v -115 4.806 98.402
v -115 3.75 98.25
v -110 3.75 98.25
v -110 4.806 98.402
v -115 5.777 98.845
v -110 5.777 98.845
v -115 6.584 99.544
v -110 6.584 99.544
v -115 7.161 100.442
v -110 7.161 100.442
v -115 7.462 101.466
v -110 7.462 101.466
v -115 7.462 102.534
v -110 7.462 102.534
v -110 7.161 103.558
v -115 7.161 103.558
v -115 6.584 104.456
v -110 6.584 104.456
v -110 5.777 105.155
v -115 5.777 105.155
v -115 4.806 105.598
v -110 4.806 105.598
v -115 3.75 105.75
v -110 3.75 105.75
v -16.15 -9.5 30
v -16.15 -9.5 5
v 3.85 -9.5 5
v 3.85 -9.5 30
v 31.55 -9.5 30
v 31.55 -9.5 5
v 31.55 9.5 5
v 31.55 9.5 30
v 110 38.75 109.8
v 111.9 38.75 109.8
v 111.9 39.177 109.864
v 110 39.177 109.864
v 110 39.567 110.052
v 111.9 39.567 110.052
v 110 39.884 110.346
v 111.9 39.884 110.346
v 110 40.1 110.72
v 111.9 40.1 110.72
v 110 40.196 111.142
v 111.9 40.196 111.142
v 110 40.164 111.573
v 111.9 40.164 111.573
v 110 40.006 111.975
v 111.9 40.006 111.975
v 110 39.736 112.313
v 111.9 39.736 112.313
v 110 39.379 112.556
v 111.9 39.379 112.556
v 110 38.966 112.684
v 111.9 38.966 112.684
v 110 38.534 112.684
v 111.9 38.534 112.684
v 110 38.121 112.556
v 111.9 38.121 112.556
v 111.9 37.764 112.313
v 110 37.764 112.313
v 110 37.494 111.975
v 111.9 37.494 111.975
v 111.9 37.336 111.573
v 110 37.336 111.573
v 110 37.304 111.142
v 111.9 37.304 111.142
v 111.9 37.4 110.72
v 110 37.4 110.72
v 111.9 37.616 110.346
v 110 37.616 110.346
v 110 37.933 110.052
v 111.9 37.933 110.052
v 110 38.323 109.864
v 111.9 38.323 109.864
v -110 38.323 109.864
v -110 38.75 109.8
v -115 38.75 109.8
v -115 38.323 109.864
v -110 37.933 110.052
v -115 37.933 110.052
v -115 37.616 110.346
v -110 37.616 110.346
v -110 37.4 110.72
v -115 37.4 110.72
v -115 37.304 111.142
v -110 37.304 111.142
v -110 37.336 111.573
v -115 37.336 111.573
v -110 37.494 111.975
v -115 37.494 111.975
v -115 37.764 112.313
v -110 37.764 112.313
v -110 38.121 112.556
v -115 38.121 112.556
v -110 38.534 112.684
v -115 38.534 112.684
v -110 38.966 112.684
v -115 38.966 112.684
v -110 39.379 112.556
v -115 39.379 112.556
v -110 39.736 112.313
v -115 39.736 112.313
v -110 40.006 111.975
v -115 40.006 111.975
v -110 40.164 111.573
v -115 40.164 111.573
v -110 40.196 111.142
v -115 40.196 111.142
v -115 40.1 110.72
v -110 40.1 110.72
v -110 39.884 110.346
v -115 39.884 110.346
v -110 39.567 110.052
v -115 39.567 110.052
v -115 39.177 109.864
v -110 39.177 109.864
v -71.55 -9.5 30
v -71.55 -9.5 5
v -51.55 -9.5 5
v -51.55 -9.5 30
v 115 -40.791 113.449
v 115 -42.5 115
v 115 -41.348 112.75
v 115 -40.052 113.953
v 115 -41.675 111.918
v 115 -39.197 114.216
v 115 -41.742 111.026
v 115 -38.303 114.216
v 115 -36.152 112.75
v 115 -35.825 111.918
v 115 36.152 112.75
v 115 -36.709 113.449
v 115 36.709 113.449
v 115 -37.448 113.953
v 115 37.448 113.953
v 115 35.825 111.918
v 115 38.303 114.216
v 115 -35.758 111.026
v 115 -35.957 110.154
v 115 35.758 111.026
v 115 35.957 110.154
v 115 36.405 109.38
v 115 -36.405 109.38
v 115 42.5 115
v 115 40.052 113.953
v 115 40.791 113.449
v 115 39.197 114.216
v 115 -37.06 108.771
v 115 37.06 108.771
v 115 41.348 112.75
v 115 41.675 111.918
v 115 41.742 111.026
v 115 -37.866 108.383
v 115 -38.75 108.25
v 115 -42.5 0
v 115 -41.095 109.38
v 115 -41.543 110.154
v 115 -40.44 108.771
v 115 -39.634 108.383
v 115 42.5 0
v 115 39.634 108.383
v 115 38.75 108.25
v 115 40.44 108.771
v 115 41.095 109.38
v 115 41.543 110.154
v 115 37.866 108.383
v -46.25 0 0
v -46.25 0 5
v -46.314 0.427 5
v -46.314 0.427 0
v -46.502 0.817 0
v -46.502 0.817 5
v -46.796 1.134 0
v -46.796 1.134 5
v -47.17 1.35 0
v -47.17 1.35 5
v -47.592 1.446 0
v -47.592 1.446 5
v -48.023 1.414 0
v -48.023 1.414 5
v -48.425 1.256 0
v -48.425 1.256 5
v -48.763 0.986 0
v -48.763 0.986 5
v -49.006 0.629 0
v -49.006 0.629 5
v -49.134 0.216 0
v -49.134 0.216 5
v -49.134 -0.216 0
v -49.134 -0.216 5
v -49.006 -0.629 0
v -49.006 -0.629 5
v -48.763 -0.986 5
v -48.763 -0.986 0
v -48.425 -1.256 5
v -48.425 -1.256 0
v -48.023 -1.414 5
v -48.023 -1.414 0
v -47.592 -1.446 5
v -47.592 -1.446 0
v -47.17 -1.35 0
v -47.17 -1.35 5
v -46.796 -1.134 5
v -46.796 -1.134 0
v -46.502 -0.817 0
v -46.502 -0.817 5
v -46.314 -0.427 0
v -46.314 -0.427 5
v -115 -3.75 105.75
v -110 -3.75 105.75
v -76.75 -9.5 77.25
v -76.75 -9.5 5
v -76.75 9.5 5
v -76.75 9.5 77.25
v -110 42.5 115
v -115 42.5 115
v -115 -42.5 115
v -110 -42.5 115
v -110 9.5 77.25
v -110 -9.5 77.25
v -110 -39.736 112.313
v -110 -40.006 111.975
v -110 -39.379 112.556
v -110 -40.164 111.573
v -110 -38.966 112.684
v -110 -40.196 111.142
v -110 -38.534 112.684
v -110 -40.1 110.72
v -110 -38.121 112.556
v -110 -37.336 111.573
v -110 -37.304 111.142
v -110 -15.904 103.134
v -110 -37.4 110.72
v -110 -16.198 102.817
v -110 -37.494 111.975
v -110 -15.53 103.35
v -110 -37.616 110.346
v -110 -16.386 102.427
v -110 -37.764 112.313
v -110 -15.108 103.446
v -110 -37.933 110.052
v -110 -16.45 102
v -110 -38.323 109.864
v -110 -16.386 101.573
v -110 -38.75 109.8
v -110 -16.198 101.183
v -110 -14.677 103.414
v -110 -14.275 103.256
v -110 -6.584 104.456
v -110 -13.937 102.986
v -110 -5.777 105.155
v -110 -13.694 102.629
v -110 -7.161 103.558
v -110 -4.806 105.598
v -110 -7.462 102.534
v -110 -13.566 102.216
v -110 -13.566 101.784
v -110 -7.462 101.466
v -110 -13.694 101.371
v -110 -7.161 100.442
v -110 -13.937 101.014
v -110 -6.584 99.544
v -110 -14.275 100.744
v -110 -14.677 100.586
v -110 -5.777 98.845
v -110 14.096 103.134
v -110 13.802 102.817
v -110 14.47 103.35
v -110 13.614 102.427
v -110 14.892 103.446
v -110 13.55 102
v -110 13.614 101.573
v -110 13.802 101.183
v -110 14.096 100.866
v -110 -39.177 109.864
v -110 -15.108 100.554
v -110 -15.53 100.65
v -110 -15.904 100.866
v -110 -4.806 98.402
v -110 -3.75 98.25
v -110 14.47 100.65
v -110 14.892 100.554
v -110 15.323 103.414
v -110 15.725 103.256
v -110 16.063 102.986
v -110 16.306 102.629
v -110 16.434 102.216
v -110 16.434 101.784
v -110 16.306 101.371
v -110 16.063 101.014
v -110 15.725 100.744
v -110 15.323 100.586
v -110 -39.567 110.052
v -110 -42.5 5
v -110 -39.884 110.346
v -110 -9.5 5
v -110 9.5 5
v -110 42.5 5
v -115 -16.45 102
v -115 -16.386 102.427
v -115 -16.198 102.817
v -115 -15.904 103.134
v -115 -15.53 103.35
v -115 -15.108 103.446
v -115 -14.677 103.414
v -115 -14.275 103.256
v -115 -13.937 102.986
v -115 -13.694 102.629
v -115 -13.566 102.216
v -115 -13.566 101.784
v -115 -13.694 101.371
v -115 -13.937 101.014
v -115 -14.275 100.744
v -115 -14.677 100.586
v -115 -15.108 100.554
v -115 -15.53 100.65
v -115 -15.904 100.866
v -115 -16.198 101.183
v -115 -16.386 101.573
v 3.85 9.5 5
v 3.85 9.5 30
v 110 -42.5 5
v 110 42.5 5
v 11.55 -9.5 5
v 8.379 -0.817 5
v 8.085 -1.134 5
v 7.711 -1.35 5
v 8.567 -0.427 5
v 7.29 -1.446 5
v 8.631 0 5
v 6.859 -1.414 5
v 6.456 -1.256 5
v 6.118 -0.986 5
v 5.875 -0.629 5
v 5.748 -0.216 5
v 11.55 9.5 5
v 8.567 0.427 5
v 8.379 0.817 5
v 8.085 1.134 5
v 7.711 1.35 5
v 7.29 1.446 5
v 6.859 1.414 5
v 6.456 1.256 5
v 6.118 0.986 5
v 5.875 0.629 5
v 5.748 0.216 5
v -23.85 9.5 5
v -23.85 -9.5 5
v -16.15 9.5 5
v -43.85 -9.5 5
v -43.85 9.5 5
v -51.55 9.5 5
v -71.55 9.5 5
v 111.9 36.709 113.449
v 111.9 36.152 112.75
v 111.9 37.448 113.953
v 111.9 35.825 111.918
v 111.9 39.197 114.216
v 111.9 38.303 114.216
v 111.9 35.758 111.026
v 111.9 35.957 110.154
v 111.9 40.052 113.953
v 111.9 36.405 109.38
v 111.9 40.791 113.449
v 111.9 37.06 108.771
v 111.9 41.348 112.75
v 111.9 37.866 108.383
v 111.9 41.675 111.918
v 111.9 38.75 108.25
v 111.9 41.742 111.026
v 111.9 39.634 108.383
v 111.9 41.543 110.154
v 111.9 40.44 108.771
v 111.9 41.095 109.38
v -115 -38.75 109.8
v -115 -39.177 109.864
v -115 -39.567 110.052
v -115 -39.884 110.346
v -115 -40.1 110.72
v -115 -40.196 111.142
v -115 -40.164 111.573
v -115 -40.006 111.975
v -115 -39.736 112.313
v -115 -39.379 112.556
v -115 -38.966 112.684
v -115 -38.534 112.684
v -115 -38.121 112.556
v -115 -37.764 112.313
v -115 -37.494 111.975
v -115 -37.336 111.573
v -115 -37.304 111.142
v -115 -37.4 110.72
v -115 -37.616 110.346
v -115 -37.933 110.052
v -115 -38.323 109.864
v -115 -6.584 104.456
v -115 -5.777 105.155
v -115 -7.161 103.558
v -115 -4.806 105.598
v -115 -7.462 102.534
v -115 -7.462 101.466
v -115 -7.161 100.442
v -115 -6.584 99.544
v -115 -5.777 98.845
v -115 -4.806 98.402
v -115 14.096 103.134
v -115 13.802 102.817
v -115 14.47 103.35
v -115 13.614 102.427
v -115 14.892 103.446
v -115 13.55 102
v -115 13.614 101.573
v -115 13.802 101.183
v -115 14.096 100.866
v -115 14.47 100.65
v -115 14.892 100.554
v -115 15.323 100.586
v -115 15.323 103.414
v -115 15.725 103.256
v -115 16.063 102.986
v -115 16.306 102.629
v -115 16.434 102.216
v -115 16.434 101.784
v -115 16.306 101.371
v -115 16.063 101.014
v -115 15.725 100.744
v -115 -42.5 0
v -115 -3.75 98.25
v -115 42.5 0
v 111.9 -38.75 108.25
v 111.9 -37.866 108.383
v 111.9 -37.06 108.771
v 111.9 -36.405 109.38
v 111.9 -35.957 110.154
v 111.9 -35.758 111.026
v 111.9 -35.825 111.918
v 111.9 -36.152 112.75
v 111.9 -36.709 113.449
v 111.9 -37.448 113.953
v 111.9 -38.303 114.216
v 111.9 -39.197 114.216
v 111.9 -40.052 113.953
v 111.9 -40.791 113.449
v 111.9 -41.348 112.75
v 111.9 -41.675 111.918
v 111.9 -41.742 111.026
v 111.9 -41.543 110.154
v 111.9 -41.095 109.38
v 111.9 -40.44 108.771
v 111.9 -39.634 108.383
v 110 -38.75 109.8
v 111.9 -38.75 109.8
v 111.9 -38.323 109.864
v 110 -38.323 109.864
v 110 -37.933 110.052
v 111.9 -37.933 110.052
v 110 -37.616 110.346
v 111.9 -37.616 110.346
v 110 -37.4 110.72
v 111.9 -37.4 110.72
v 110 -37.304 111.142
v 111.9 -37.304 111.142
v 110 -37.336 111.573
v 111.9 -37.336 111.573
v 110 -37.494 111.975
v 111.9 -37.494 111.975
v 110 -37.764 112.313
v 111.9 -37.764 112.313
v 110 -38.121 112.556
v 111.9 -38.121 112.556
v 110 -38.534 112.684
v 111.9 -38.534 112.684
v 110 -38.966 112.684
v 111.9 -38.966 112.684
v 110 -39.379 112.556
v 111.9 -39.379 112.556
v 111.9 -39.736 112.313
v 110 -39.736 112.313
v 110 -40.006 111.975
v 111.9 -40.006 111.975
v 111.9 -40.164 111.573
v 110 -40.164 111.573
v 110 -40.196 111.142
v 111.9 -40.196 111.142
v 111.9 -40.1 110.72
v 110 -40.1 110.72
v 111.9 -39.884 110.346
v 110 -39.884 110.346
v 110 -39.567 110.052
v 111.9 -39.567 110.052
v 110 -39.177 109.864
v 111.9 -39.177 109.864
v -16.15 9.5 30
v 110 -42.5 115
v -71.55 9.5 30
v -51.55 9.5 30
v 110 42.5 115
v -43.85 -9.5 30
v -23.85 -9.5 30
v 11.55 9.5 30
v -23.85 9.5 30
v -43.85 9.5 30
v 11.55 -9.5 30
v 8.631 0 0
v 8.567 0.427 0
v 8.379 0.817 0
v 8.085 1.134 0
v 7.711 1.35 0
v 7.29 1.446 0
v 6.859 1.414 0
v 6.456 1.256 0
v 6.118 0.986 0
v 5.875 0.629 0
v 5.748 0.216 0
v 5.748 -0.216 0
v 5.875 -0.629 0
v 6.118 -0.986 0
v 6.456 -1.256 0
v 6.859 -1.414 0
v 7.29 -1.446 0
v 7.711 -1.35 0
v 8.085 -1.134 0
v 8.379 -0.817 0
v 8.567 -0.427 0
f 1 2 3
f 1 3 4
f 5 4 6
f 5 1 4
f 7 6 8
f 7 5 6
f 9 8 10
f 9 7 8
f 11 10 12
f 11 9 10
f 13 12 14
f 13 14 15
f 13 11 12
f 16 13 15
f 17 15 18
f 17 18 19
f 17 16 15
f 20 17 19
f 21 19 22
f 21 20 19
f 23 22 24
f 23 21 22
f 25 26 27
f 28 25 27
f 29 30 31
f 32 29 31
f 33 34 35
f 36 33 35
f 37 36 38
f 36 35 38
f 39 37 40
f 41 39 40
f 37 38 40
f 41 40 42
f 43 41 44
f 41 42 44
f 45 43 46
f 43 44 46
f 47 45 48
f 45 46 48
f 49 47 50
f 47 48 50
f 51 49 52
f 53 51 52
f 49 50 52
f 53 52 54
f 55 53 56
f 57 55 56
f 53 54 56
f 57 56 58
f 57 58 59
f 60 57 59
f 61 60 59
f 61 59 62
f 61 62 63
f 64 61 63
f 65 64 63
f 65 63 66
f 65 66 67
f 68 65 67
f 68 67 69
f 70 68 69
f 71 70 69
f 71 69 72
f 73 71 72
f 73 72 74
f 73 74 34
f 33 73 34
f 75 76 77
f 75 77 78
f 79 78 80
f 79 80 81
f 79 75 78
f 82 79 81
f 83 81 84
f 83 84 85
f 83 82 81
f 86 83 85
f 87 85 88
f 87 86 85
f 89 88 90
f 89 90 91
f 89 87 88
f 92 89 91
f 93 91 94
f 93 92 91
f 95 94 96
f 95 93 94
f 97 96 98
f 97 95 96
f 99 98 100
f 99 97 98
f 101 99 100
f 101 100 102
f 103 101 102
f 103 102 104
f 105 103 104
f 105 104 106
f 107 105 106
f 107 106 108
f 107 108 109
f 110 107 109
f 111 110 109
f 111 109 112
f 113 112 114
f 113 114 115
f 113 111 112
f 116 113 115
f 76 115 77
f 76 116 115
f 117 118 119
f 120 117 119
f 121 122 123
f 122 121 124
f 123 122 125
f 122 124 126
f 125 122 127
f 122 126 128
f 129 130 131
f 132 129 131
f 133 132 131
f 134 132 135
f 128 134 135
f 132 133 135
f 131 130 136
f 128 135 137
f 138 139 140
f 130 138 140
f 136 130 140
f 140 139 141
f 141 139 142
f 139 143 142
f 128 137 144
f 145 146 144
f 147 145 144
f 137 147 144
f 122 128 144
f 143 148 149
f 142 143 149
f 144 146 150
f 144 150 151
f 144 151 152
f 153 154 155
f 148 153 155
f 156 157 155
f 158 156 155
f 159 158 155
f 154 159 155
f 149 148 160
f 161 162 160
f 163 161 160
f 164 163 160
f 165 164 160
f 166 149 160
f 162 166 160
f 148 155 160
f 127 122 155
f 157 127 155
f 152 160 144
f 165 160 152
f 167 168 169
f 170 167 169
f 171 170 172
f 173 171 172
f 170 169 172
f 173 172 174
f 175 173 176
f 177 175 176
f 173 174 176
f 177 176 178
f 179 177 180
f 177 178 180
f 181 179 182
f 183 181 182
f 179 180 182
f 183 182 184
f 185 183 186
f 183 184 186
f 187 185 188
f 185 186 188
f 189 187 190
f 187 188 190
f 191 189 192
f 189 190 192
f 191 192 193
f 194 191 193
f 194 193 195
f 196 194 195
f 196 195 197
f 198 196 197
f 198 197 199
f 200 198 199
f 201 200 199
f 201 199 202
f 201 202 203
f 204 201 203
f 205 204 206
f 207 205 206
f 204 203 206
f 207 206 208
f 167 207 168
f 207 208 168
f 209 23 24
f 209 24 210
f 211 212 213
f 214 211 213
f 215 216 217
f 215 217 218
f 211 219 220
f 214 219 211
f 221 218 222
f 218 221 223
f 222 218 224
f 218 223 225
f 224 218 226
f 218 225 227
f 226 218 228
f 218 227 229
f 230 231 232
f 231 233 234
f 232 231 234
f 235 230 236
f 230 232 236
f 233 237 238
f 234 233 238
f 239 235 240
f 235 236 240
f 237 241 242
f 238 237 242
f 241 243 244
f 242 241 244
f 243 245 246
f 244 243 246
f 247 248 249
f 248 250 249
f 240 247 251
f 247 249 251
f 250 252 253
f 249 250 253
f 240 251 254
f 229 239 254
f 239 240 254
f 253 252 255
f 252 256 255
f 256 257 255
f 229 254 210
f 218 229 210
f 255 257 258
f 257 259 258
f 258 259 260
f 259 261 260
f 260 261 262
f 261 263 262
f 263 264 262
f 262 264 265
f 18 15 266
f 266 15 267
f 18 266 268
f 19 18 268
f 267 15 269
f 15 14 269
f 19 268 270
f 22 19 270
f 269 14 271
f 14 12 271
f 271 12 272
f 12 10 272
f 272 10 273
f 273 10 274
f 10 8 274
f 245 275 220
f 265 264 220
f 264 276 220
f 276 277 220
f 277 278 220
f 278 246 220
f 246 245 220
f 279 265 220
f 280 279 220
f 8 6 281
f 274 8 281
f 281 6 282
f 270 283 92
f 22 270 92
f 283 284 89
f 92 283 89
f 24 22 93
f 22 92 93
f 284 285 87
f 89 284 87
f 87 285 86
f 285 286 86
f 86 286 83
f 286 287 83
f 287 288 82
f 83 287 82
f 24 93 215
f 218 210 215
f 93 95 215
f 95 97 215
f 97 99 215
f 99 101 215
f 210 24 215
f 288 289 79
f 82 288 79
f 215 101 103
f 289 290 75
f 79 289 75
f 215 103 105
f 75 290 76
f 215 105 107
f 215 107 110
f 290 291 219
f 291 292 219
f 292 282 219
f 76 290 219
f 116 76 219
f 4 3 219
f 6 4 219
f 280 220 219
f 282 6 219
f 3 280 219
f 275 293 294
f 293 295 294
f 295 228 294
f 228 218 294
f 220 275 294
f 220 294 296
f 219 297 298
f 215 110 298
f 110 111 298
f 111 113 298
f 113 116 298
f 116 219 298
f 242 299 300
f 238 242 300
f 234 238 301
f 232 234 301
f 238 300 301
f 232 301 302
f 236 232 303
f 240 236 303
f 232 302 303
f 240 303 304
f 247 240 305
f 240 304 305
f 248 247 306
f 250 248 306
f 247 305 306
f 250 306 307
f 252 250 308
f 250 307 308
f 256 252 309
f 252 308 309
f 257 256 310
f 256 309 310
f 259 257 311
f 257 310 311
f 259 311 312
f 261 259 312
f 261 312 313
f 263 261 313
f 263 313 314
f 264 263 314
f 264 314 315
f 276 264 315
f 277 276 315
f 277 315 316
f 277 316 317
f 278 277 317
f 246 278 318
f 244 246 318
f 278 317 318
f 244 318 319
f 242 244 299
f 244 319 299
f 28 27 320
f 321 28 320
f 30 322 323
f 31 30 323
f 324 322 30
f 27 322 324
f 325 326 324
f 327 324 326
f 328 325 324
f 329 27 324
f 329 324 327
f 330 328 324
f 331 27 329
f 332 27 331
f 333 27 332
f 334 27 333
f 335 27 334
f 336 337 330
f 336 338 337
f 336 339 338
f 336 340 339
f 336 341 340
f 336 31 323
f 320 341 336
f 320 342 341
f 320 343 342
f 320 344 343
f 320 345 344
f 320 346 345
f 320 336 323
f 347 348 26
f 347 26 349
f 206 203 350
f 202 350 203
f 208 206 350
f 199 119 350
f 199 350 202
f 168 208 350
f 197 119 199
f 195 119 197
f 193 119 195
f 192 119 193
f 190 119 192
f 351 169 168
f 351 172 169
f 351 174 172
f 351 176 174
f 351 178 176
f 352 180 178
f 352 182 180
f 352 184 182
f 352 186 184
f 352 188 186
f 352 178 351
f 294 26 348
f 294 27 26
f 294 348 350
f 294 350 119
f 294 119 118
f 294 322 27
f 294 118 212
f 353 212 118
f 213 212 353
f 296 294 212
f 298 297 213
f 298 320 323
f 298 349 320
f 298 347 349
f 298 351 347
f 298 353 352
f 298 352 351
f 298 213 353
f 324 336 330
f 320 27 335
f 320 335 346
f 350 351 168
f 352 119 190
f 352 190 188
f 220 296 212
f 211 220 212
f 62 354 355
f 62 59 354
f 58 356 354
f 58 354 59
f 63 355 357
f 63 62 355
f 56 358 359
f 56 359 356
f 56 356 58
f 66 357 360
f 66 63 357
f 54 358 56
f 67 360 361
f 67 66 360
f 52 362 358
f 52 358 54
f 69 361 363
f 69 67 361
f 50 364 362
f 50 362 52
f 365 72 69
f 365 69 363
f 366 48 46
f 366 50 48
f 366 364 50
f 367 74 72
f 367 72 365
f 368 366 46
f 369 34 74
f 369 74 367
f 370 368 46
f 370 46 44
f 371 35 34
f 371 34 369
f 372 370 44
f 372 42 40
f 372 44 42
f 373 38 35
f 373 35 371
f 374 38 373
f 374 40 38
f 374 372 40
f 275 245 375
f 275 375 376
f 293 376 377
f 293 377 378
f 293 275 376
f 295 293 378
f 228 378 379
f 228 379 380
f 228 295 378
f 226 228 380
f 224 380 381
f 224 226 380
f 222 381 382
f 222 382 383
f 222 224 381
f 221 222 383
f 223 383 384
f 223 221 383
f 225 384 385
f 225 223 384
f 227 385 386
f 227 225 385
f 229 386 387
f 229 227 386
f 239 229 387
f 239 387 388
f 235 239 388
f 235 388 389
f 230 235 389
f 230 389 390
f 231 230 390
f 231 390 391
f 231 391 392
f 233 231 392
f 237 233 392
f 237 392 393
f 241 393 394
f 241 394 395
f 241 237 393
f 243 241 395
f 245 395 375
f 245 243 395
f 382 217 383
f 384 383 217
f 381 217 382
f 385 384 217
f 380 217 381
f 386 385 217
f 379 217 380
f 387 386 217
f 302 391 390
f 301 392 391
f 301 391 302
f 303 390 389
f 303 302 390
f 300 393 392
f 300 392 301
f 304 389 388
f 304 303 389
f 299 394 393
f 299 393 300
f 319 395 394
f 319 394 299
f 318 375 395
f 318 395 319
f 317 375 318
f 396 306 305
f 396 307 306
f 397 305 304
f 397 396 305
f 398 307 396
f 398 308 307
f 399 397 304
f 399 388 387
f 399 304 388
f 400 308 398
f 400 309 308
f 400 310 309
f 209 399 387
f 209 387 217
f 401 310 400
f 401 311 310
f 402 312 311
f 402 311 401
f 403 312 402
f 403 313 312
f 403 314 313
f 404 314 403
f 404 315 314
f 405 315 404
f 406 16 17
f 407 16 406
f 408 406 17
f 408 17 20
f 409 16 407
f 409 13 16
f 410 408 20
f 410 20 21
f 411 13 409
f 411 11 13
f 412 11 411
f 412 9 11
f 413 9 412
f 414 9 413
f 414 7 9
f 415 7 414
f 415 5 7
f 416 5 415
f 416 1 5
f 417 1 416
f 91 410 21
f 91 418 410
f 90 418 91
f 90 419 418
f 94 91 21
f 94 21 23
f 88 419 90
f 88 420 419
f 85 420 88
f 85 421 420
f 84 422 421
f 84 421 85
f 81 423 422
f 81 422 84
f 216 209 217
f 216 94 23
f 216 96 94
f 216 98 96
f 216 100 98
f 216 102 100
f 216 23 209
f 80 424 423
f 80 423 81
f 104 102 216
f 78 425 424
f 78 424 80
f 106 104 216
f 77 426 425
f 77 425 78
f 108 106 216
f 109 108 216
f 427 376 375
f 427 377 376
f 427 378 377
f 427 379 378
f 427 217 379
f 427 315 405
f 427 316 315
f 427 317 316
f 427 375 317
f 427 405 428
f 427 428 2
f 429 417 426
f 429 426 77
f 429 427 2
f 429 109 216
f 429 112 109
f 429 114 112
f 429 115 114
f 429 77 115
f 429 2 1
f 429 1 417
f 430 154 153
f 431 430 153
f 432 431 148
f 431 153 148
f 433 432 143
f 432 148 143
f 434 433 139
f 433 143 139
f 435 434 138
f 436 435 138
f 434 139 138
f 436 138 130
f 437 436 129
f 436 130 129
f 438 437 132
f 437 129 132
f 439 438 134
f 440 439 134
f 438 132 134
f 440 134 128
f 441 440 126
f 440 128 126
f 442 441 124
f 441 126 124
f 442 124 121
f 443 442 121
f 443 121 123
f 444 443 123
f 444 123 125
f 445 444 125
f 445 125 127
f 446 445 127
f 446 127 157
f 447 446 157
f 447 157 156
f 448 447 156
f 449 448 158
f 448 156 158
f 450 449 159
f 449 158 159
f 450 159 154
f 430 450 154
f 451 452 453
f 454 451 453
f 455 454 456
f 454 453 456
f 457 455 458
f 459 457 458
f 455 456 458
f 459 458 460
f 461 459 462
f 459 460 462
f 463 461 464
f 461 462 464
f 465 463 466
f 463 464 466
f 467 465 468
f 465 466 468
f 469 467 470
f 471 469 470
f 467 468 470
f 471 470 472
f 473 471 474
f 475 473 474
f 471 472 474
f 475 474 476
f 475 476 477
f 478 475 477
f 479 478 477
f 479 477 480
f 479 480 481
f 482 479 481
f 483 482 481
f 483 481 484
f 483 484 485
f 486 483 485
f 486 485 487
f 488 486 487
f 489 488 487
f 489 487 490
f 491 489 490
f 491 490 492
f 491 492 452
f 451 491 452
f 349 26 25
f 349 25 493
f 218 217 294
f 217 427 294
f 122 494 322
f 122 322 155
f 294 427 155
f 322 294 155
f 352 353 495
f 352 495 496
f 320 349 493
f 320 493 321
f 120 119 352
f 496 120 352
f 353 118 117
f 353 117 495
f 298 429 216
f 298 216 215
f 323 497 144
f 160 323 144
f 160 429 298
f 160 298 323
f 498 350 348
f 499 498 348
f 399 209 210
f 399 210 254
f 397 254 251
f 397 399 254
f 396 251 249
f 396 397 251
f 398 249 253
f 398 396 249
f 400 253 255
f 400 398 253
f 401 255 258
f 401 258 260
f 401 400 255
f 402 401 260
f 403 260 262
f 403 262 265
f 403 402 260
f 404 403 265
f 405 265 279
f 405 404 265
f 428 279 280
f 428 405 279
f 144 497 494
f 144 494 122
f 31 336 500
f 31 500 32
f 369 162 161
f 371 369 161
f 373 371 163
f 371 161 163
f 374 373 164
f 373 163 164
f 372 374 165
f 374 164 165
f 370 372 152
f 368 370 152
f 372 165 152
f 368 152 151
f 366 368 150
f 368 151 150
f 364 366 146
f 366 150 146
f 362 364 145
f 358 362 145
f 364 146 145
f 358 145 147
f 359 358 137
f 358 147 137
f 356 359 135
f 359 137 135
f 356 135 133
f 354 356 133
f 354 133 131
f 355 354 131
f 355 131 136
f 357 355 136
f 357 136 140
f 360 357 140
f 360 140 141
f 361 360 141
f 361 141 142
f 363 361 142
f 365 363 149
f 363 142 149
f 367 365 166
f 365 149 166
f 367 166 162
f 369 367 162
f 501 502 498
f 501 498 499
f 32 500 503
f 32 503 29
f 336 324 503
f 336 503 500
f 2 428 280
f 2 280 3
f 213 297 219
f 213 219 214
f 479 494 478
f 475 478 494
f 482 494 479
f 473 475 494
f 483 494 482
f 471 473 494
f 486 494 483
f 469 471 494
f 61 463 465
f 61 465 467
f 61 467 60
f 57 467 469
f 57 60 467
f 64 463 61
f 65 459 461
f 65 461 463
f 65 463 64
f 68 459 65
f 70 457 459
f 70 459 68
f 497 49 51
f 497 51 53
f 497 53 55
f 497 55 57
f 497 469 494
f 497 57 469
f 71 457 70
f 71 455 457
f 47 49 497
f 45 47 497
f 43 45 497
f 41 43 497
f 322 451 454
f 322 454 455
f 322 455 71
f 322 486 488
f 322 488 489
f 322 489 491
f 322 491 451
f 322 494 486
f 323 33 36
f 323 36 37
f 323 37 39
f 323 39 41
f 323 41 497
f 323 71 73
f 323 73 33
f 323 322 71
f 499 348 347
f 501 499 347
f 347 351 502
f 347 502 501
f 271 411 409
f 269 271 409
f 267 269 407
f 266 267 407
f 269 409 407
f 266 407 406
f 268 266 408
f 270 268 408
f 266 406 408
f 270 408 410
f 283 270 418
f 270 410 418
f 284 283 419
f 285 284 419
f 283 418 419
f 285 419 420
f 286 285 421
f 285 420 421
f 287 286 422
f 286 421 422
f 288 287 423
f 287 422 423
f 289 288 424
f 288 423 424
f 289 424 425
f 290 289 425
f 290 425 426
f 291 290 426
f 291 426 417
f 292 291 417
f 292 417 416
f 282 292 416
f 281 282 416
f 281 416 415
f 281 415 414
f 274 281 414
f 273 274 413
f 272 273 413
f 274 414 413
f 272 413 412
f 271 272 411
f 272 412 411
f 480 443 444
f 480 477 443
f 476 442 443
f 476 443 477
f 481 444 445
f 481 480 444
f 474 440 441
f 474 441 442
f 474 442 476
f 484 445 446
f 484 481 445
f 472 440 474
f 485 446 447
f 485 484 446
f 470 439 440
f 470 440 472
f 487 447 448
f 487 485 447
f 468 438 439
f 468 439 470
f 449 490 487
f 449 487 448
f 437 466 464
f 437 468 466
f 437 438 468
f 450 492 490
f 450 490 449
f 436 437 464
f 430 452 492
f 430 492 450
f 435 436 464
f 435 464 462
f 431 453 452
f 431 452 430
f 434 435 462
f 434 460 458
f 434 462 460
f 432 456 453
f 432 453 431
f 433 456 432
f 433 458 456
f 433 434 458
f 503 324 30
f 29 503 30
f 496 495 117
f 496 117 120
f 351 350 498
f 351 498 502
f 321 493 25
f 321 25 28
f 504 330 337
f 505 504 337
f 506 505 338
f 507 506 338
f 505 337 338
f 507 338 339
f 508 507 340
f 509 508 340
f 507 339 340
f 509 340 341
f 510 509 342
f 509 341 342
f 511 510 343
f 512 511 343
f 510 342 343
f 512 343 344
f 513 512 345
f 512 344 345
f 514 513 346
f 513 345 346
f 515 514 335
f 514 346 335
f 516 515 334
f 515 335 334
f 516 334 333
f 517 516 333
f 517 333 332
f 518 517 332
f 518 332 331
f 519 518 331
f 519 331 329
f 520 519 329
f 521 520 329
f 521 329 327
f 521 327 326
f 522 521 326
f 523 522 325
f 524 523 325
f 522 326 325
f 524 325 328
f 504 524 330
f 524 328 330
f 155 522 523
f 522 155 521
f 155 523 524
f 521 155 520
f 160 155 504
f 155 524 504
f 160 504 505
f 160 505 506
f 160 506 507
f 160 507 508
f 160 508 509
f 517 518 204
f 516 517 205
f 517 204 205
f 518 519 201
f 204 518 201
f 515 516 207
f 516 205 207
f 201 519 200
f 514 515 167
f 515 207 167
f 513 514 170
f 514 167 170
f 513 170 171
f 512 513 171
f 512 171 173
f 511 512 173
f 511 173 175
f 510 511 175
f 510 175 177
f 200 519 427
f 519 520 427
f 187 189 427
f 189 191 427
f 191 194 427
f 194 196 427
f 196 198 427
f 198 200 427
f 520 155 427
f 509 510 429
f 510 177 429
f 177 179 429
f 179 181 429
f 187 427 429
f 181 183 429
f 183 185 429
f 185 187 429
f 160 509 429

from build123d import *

# Parameters (mm, degrees)
BOSS_EXTRUDE1_DEPTH = 5
SKETCH2_W           = 5
SKETCH2_H           = 85
BOSS_EXTRUDE3_DEPTH = 110
SKETCH2_3_W         = 20
SKETCH2_3_H         = 19
BOSS_EXTRUDE4_DEPTH = 25
SKETCH3_R           = 1.45
CUT_EXTRUDE1_DEPTH  = 5
SKETCH4_R           = 1.45
CUT_EXTRUDE2_DEPTH  = 5
SKETCH5_R           = 3
SKETCH5_R_2         = 1.45
CUT_EXTRUDE3_DEPTH  = 3.1
SKETCH5_2_R         = 1.45
CUT_EXTRUDE4_DEPTH  = 5
CUT_EXTRUDE5_START  = -5
SKETCH6_R           = 1.45
CUT_EXTRUDE5_DEPTH  = 5
SKETCH2_7_W         = 33.25
SKETCH2_7_H         = 19
BOSS_EXTRUDE6_DEPTH = 72.25


with BuildPart() as part:
    # Sketch1 → Boss-Extrude1 (new body)
    with BuildSketch(Plane(origin=(0, 0, 0), x_dir=(0, 1, 0), z_dir=(0, 0, 1))):
        Polygon((-42.5, 94.306537639), (-42.5, -115), (42.5, -115), (42.5, 94.306537639), (42.5, 115), (-42.5, 115), align=None)
    extrude(amount=BOSS_EXTRUDE1_DEPTH)

    # Sketch2 → Boss-Extrude3 (add)
    with BuildSketch(Plane.XY.offset(5)):
        with Locations((-112.5, 0)):
            Rectangle(SKETCH2_W, SKETCH2_H)
        with Locations((112.5, 0)):
            Rectangle(SKETCH2_W, SKETCH2_H)
    extrude(amount=BOSS_EXTRUDE3_DEPTH)

    # Sketch2<3> → Boss-Extrude4 (add)
    with BuildSketch(Plane.XY.offset(5)):
        with Locations((-61.55, 0)):
            Rectangle(SKETCH2_3_W, SKETCH2_3_H)
        with Locations((-33.85, 0)):
            Rectangle(SKETCH2_3_W, SKETCH2_3_H)
        with Locations((-6.15, 0)):
            Rectangle(SKETCH2_3_W, SKETCH2_3_H)
        with Locations((21.55, 0)):
            Rectangle(SKETCH2_3_W, SKETCH2_3_H)
    extrude(amount=BOSS_EXTRUDE4_DEPTH)

    # Sketch3 → Cut-Extrude1 (cut)
    with BuildSketch(Plane(origin=(-115, 0, 0), x_dir=(0, -1, 0), z_dir=(-1, 0, 0))):
        with Locations((-15, 102)):
            Circle(SKETCH3_R)
        with Locations((15, 102)):
            Circle(SKETCH3_R)
        with BuildLine():
            Line((-3.75, 105.75), (3.75, 105.75))
            ThreePointArc((3.75, 105.75), (7.5, 102), (3.75, 98.25))
            Line((3.75, 98.25), (-3.75, 98.25))
            ThreePointArc((-3.75, 98.25), (-7.5, 102), (-3.75, 105.75))
        make_face()
    extrude(amount=-CUT_EXTRUDE1_DEPTH, mode=Mode.SUBTRACT)

    # Sketch4 → Cut-Extrude2 (cut)
    with BuildSketch(Plane.XY.offset(5)):
        with Locations((-47.7, 0)):
            Circle(SKETCH4_R)
        with Locations((7.181418717, 0)):
            Circle(SKETCH4_R)
    extrude(amount=-CUT_EXTRUDE2_DEPTH, mode=Mode.SUBTRACT)

    # Sketch5 → Cut-Extrude3 (cut)
    # profile 1 of 2: a face of its own
    with BuildSketch(Plane.YZ.offset(115)):
        with Locations(Location((-38.75, 111.25, 0), (0, 0, 270))):
            Circle(SKETCH5_R)
        with Locations(Location((-38.75, 111.25, 0), (0, 0, 270))):
            Circle(SKETCH5_R_2, mode=Mode.SUBTRACT)
    # profile 2 of 2: a face of its own
    with BuildSketch(Plane.YZ.offset(115)):
        with Locations(Location((38.75, 111.25, 0), (0, 0, 270))):
            Circle(SKETCH5_R)
        with Locations(Location((38.75, 111.25, 0), (0, 0, 270))):
            Circle(SKETCH5_R_2, mode=Mode.SUBTRACT)
    extrude(amount=-CUT_EXTRUDE3_DEPTH, mode=Mode.SUBTRACT)

    # Sketch5<2> → Cut-Extrude4 (cut)
    with BuildSketch(Plane.YZ.offset(115)):
        with Locations(Location((-38.75, 111.25, 0), (0, 0, 270))):
            Circle(SKETCH5_2_R)
        with Locations(Location((38.75, 111.25, 0), (0, 0, 270))):
            Circle(SKETCH5_2_R)
    extrude(amount=-CUT_EXTRUDE4_DEPTH, mode=Mode.SUBTRACT)

    # Sketch6 → Cut-Extrude5 (cut)
    with BuildSketch(Plane(origin=(-115, 0, 0), x_dir=(0, -1, 0), z_dir=(-1, 0, 0)).offset(CUT_EXTRUDE5_START)):
        with Locations(Location((-38.75, 111.25, 0), (0, 0, 270))):
            Circle(SKETCH6_R)
        with Locations(Location((38.75, 111.25, 0), (0, 0, 270))):
            Circle(SKETCH6_R)
    extrude(amount=CUT_EXTRUDE5_DEPTH, mode=Mode.SUBTRACT)

    # Sketch2<7> → Boss-Extrude6 (add)
    with BuildSketch(Plane.XY.offset(5)):
        with Locations((-93.375, 0)):
            Rectangle(SKETCH2_7_W, SKETCH2_7_H)
    extrude(amount=BOSS_EXTRUDE6_DEPTH)


solid = part.part
